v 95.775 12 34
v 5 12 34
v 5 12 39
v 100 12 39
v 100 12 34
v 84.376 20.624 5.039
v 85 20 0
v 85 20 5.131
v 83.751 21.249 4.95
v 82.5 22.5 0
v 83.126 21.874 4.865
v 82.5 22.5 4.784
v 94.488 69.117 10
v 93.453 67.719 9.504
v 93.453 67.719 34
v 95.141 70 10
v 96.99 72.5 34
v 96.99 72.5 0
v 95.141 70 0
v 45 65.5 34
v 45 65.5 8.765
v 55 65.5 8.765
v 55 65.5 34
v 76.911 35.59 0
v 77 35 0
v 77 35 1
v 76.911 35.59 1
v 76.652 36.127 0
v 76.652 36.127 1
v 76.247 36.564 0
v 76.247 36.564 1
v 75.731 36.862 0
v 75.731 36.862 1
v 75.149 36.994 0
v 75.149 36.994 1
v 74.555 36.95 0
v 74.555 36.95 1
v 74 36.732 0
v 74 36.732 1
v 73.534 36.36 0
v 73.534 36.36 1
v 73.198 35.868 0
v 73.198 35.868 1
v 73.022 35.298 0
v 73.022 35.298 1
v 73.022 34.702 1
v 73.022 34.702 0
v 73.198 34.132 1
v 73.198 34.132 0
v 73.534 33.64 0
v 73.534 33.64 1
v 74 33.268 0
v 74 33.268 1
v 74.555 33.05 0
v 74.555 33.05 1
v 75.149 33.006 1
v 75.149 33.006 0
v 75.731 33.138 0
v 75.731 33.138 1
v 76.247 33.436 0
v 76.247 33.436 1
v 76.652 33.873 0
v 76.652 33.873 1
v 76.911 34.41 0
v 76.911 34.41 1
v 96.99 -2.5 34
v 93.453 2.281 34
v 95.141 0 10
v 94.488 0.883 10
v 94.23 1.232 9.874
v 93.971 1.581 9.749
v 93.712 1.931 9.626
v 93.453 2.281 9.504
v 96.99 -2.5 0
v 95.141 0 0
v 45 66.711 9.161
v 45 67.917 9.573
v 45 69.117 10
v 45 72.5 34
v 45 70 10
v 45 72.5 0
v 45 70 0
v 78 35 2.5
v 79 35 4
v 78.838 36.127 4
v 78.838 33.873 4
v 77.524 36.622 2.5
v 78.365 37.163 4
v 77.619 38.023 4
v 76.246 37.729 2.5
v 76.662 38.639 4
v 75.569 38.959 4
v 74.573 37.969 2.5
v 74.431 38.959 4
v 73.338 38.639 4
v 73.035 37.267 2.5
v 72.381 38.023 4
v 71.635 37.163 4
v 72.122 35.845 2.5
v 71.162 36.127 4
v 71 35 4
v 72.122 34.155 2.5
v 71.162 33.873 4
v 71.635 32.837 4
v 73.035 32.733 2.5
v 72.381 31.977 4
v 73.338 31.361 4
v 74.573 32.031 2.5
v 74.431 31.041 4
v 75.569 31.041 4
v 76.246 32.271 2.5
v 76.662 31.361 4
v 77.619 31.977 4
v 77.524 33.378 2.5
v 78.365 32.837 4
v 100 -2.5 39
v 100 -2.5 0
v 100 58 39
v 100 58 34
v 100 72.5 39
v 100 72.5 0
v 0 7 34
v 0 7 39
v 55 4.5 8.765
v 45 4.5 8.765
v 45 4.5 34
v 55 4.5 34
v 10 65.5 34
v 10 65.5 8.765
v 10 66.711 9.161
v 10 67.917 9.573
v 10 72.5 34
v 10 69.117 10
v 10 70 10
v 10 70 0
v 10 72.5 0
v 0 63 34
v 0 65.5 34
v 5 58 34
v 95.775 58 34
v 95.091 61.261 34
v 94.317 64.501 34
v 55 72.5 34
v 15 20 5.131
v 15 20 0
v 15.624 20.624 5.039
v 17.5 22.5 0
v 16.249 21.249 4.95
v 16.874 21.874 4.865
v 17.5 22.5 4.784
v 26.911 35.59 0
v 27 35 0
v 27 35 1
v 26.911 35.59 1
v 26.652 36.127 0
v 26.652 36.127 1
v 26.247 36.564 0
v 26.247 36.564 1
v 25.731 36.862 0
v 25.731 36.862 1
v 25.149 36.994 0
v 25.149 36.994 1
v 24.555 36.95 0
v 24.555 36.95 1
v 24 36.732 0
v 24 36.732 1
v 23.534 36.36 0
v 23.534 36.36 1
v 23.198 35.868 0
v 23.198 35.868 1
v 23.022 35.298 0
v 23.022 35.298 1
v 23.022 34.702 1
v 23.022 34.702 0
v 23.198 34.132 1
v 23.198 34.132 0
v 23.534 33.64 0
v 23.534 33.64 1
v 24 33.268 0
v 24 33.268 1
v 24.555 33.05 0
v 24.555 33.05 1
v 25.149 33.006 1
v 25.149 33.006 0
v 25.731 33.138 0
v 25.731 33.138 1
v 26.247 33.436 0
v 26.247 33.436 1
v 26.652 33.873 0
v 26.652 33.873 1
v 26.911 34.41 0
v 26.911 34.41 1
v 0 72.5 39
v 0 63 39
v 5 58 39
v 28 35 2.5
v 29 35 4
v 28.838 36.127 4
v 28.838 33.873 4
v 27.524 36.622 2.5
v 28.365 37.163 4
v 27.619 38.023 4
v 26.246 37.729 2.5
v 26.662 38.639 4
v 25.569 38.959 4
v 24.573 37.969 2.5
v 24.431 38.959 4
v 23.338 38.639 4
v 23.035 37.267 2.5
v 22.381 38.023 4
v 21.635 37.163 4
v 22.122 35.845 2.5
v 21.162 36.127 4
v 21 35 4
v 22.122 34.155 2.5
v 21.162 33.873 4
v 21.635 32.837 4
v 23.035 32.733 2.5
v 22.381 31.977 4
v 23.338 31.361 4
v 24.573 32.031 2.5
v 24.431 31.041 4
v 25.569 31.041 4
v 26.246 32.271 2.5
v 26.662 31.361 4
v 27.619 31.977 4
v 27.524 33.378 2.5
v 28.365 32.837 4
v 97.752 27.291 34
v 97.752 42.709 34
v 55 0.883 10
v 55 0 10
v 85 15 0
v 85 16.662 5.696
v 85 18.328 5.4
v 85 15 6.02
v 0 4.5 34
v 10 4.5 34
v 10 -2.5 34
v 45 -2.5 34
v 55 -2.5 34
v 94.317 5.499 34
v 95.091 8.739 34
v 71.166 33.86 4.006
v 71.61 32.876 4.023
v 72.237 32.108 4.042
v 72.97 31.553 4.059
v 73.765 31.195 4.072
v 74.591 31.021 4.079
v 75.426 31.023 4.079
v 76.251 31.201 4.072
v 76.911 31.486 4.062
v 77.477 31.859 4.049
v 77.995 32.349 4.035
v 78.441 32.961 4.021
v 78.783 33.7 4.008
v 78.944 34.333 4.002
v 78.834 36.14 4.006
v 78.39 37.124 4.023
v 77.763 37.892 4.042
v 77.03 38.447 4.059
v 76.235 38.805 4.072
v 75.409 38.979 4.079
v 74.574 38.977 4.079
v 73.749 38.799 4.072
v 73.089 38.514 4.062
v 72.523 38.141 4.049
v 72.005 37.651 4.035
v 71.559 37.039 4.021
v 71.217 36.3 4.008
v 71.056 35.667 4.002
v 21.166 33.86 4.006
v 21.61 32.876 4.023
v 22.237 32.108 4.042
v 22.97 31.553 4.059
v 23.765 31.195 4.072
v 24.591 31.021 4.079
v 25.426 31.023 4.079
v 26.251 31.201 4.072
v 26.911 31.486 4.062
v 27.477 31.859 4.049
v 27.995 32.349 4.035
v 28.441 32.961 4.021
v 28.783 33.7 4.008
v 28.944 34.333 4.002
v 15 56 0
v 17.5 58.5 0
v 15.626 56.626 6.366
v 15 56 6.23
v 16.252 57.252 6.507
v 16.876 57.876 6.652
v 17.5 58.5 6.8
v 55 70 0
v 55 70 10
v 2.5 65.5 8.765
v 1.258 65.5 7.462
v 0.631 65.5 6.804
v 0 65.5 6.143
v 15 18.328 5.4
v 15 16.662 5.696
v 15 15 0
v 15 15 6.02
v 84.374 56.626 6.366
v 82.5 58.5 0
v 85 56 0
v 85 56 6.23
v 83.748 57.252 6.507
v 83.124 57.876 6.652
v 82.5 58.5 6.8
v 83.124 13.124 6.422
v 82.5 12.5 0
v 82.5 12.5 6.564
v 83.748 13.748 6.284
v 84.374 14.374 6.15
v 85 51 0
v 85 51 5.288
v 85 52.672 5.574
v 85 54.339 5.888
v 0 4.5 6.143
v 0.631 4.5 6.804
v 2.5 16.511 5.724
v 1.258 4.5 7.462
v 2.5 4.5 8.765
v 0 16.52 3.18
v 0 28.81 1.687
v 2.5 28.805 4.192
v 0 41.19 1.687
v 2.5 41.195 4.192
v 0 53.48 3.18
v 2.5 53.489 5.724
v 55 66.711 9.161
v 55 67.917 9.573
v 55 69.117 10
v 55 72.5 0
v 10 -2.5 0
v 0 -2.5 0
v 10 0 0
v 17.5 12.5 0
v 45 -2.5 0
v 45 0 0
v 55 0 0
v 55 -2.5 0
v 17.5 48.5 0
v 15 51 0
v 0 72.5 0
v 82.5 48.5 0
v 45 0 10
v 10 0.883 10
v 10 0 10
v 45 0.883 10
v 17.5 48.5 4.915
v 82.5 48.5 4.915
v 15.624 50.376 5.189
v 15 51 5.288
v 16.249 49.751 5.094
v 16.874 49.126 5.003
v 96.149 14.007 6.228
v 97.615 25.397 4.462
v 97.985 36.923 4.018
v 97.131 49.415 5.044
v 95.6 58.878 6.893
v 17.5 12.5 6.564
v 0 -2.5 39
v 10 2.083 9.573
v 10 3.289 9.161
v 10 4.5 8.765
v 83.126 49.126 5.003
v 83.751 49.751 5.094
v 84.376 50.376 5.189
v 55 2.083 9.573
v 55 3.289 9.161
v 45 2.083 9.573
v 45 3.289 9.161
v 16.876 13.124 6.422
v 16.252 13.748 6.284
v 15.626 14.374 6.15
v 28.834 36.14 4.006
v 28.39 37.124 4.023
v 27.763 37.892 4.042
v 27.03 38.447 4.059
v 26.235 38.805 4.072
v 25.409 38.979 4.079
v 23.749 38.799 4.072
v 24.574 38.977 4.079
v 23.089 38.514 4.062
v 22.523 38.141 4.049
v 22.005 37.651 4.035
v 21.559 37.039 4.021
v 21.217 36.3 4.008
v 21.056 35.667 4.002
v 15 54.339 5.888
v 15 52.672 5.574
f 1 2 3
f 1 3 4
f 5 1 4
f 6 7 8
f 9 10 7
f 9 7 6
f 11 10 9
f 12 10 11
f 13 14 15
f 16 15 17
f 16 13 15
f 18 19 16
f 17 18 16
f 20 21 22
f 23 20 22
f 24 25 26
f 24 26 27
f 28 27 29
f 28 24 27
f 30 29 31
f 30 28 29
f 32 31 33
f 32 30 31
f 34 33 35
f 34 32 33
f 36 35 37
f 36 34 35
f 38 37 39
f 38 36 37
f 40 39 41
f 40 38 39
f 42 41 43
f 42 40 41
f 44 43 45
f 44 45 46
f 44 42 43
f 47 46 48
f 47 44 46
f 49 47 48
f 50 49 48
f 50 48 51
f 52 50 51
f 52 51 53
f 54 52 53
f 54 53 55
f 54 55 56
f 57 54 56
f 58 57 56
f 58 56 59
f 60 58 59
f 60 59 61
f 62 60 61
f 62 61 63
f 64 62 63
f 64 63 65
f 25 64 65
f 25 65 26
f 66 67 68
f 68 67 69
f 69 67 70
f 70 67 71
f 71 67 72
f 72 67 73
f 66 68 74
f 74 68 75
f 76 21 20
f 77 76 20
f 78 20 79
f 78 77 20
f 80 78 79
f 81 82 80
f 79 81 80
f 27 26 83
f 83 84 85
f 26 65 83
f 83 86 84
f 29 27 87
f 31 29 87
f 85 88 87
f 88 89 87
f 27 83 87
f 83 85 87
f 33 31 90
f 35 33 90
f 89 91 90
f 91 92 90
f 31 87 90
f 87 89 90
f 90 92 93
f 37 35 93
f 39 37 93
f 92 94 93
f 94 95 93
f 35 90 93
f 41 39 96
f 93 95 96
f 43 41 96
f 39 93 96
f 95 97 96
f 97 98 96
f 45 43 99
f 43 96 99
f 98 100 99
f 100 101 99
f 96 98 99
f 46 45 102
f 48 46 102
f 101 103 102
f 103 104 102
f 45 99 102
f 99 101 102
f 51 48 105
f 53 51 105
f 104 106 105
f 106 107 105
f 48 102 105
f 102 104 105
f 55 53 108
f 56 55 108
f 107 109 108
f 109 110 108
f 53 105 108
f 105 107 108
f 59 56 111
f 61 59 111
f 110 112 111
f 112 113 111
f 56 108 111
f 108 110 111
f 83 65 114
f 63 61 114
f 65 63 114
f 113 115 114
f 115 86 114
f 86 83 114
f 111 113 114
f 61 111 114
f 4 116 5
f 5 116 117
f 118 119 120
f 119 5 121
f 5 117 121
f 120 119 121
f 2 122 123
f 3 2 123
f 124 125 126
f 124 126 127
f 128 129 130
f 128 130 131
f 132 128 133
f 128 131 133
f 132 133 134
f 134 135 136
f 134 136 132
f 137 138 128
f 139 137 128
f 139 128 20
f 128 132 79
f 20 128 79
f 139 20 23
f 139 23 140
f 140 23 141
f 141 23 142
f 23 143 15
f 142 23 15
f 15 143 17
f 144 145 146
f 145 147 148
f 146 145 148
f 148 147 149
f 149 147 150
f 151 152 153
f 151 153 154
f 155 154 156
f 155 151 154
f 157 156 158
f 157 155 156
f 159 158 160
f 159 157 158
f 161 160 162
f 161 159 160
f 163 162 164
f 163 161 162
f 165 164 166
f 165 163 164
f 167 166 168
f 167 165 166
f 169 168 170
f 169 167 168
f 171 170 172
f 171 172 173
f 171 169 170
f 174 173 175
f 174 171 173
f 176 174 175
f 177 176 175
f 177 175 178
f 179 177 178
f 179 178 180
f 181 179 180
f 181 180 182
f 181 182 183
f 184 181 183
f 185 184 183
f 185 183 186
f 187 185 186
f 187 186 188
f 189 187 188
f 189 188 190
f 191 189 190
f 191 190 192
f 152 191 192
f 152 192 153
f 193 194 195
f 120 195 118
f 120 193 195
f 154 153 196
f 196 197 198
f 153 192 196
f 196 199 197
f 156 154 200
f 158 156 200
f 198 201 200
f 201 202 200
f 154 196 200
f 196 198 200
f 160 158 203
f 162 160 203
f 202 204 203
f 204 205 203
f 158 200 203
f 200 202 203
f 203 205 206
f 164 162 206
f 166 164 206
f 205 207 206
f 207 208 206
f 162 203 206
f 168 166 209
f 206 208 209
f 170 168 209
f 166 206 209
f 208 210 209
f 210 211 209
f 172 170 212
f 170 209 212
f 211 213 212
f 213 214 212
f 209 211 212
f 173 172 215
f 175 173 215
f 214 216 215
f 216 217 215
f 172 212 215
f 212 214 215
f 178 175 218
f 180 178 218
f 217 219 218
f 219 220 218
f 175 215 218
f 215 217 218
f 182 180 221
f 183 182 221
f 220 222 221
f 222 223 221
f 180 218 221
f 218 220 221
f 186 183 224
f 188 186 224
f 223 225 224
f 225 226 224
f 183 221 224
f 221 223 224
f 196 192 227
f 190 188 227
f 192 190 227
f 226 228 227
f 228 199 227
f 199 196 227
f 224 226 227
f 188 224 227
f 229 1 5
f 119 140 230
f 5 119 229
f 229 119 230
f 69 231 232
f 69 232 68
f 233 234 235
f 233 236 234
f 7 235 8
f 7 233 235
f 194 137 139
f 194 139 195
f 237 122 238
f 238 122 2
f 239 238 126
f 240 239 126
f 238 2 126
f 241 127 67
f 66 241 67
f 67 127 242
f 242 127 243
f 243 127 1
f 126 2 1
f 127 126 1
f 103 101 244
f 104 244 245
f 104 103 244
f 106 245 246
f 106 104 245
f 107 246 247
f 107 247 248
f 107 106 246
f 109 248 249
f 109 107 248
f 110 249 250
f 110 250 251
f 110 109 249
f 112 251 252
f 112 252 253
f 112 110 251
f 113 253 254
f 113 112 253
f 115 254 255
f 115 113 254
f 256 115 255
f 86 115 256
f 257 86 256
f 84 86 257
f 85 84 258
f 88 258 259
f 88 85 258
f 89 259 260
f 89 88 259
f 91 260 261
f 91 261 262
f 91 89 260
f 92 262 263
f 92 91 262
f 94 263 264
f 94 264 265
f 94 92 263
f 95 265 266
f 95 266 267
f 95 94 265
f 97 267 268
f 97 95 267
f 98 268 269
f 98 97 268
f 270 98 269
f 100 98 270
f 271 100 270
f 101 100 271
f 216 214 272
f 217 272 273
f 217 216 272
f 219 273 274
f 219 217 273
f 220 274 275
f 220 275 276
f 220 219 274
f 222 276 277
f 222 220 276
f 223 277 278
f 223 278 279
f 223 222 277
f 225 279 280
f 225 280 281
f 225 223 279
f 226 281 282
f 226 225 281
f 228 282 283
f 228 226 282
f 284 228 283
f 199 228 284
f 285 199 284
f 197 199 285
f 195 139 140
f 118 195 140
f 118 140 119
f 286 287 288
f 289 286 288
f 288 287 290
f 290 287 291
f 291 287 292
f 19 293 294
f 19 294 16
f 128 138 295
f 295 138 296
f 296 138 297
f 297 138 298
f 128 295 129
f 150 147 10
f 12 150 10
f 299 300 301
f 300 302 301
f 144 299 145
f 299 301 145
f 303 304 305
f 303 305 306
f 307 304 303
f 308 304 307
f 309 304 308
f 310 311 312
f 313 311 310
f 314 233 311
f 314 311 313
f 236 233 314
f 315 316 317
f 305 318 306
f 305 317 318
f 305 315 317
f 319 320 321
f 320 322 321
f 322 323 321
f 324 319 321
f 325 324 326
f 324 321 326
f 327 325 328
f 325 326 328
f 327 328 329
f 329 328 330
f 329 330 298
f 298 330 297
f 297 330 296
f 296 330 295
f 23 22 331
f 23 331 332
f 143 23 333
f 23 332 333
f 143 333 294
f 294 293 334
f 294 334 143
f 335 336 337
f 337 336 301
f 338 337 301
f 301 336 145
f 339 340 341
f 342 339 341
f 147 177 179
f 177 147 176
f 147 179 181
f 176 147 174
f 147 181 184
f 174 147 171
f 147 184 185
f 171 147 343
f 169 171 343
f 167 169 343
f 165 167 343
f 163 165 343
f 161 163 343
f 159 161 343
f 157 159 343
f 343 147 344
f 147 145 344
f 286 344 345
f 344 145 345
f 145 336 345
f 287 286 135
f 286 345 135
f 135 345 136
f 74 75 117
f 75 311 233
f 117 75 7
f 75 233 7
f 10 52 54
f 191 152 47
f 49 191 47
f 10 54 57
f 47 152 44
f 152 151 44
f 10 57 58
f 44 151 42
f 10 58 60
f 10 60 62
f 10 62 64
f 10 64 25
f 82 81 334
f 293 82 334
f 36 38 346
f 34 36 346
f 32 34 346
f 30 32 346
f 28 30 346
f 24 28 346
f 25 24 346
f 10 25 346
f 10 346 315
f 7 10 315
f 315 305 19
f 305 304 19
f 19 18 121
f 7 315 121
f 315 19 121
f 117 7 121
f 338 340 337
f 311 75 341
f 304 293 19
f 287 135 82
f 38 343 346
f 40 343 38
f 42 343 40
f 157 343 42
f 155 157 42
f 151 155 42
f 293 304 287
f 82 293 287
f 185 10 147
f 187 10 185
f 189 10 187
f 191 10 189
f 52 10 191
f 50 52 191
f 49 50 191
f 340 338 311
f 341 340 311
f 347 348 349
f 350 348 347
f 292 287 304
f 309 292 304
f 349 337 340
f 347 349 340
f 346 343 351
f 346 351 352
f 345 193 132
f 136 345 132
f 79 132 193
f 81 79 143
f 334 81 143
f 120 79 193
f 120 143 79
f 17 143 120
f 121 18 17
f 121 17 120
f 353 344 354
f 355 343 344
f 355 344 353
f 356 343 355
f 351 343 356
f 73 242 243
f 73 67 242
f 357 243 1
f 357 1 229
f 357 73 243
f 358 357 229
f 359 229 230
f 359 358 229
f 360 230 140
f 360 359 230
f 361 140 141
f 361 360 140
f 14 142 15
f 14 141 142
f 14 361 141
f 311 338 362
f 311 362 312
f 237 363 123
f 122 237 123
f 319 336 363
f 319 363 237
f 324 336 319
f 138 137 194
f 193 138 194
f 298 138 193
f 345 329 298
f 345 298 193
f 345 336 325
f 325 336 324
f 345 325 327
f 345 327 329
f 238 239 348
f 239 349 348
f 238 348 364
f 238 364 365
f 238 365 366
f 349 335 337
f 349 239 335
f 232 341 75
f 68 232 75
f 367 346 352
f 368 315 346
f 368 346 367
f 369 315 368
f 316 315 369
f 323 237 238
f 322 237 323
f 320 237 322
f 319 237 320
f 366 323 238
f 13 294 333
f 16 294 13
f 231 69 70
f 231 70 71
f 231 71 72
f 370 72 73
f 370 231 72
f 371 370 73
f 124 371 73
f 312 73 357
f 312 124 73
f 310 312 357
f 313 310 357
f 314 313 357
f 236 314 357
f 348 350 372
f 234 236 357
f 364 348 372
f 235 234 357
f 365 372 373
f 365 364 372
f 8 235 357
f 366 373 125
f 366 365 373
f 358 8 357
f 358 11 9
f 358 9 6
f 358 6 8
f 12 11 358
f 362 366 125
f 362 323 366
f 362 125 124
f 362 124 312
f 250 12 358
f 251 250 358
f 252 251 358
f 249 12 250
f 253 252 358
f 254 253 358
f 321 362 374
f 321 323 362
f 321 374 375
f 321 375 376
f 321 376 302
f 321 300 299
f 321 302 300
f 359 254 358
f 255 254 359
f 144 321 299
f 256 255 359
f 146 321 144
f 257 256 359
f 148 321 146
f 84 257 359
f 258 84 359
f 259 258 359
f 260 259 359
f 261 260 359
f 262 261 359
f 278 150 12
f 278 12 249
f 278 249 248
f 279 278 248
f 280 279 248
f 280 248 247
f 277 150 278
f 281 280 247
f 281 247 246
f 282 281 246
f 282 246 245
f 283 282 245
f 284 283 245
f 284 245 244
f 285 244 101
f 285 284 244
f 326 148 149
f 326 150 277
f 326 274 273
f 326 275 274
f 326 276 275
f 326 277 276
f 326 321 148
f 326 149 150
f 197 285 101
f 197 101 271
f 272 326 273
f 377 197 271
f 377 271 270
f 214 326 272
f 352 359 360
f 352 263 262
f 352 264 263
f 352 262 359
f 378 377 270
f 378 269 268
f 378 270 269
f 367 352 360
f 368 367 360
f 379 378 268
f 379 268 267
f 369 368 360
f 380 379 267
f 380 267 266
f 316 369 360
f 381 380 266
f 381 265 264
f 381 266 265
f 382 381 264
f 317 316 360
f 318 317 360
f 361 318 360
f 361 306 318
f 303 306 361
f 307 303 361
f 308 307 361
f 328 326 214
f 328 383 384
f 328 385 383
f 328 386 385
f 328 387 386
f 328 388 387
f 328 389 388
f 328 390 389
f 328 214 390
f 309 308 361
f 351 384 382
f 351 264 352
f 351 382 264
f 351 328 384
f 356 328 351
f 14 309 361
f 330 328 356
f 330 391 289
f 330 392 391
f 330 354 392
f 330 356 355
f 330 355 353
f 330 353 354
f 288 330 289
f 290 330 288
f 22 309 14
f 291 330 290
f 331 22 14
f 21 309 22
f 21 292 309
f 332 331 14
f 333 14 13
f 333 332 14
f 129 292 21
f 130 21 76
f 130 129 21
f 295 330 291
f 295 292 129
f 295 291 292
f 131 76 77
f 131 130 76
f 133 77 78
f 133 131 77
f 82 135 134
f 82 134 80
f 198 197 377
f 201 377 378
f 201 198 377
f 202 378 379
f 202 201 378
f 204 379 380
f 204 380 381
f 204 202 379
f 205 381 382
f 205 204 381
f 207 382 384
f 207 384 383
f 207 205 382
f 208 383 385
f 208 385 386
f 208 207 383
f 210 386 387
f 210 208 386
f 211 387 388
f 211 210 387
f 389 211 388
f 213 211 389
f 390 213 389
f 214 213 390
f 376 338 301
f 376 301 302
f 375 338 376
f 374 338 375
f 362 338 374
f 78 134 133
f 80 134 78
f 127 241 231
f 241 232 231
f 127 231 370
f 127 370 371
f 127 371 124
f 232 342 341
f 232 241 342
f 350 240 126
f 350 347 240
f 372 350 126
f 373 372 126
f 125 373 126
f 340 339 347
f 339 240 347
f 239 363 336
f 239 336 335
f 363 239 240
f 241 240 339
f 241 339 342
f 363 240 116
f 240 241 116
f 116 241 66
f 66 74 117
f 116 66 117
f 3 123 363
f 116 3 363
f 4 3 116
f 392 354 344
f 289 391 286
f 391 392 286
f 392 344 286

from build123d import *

# Parameters (mm, degrees)
CYLINDER001_R     = 120
CYLINDER001_DEPTH = 40
BOX001_W          = 10
BOX001_H          = 75
BOX001_DEPTH      = 34
CHAMFER004_SIZE   = 5
BOX008_W          = 70
BOX008_H          = 10
BOX008_DEPTH      = 10
CHAMFER_SIZE      = 2.5
BOX009_W          = 70
BOX009_H          = 10
BOX009_DEPTH      = 10
CHAMFER001_SIZE   = 2.5
CYLINDER005_R     = 2
CYLINDER005_DEPTH = 10
CYLINDER004_R     = 4
CYLINDER004_DEPTH = 10
CYLINDER003_R     = 2
CYLINDER003_DEPTH = 10
CYLINDER002_R     = 4
CYLINDER002_DEPTH = 10
CYLINDER_R        = 100
CYLINDER_DEPTH    = 100
BOX_W             = 100
BOX_H             = 70
BOX_DEPTH         = 10
CHAMFER012_SIZE   = 2.5
BOX002_W          = 10
BOX002_H          = 7
BOX002_DEPTH      = 34
BOX003_W          = 100
BOX003_H          = 14.5
BOX003_DEPTH      = 5
BOX004_W          = 10
BOX004_H          = 7
BOX004_DEPTH      = 34
BOX005_W          = 10
BOX005_H          = 7
BOX005_DEPTH      = 34
BOX006_W          = 10
BOX006_H          = 7
BOX006_DEPTH      = 34
BOX007_W          = 100
BOX007_H          = 14.5
BOX007_DEPTH      = 5
CHAMFER013_SIZE   = 5


with BuildPart() as cylinder001:
    # Cylinder001 → Cylinder001 (new body)
    with BuildSketch(Plane(origin=(-22, 35, 0), x_dir=(1, 0, 0), z_dir=(0, 0, 1))):
        Circle(CYLINDER001_R)
    extrude(amount=CYLINDER001_DEPTH)


with BuildPart() as chamfer004:
    # Box001 → Box001 (new body)
    with BuildSketch(Plane(origin=(90, -2.5, 0), x_dir=(1, 0, 0), z_dir=(0, 0, 1))):
        with Locations((5, 37.5)):
            Rectangle(BOX001_W, BOX001_H)
    extrude(amount=BOX001_DEPTH)

    # Cut001: cut Cylinder001
    add(cylinder001.part, mode=Mode.SUBTRACT)

    # Chamfer004
    chamfer004_edges = [chamfer004.edges().sort_by_distance(p)[0] for p in [
        (91.990131, -2.5, 17),
        (91.990131, 72.5, 17),
    ]]
    chamfer(chamfer004_edges, length=CHAMFER004_SIZE)


with BuildPart() as chamfer_body:
    # Box008 → Box008 (new body)
    with BuildSketch(Plane.XY):
        with Locations((35, 5)):
            Rectangle(BOX008_W, BOX008_H)
    extrude(amount=BOX008_DEPTH)

    # Chamfer
    chamfer_edges = [chamfer_body.edges().sort_by_distance(p)[0] for p in [
        (0, 0, 5),
        (0, 10, 5),
        (70, 0, 5),
        (70, 10, 5),
    ]]
    chamfer(chamfer_edges, length=CHAMFER_SIZE)


with BuildPart() as chamfer_body_1:
    # Chamfer placement: moved
    add(chamfer_body.part.moved(Location((15, 12.5, 0))))


with BuildPart() as fusion004:
    # Box009 → Box009 (new body)
    with BuildSketch(Plane.XY):
        with Locations((35, 5)):
            Rectangle(BOX009_W, BOX009_H)
    extrude(amount=BOX009_DEPTH)

    # Chamfer001
    chamfer001_edges = [fusion004.edges().sort_by_distance(p)[0] for p in [
        (0, 0, 5),
        (0, 10, 5),
        (70, 0, 5),
        (70, 10, 5),
    ]]
    chamfer(chamfer001_edges, length=CHAMFER001_SIZE)


with BuildPart() as fusion004_1:
    # Chamfer001 placement: moved
    add(fusion004.part.moved(Location((15, 48.5, 0))))

    # Fusion004: union Chamfer body
    add(chamfer_body_1.part)


with BuildPart() as cone001:
    # Cone001 → Cone001 (revolve)
    with BuildSketch(Plane(origin=(0, 35, 10), x_dir=(1, 0, 0), z_dir=(0, -1, 0))):
        Polygon((0, 0), (2, 0), (4, 3), (0, 3), align=None)
    revolve(axis=Axis((0, 35, 10), (0, 0, 1)))


with BuildPart() as cylinder005:
    # Cylinder005 → Cylinder005 (new body)
    with BuildSketch(Plane(origin=(0, 35, 0), x_dir=(1, 0, 0), z_dir=(0, 0, 1))):
        Circle(CYLINDER005_R)
    extrude(amount=CYLINDER005_DEPTH)


with BuildPart() as countersink_mount001:
    # Cylinder004 → Cylinder004 (new body)
    with BuildSketch(Plane(origin=(0, 35, 13), x_dir=(1, 0, 0), z_dir=(0, 0, 1))):
        Circle(CYLINDER004_R)
    extrude(amount=CYLINDER004_DEPTH)

    # Fusion001: union Cone001, Cylinder005
    add(cone001.part)
    add(cylinder005.part)


with BuildPart() as countersink_mount001_1:
    # Fusion001 placement: moved
    add(countersink_mount001.part.moved(Location((75, 0, -9))))


with BuildPart() as cone:
    # Cone → Cone (revolve)
    with BuildSketch(Plane(origin=(0, 35, 10), x_dir=(1, 0, 0), z_dir=(0, -1, 0))):
        Polygon((0, 0), (2, 0), (4, 3), (0, 3), align=None)
    revolve(axis=Axis((0, 35, 10), (0, 0, 1)))


with BuildPart() as cylinder003:
    # Cylinder003 → Cylinder003 (new body)
    with BuildSketch(Plane(origin=(0, 35, 0), x_dir=(1, 0, 0), z_dir=(0, 0, 1))):
        Circle(CYLINDER003_R)
    extrude(amount=CYLINDER003_DEPTH)


with BuildPart() as fusion002:
    # Cylinder002 → Cylinder002 (new body)
    with BuildSketch(Plane(origin=(0, 35, 13), x_dir=(1, 0, 0), z_dir=(0, 0, 1))):
        Circle(CYLINDER002_R)
    extrude(amount=CYLINDER002_DEPTH)

    # Fusion: union Cone, Cylinder003
    add(cone.part)
    add(cylinder003.part)


with BuildPart() as fusion002_1:
    # Fusion placement: moved
    add(fusion002.part.moved(Location((25, 0, -9))))

    # Fusion002: union countersink mount001
    add(countersink_mount001_1.part)


with BuildPart() as cylinder:
    # Cylinder → Cylinder (new body)
    with BuildSketch(Plane(origin=(0, 35, 104), x_dir=(0, 0, -1), z_dir=(1, 0, 0))):
        Circle(CYLINDER_R)
    extrude(amount=CYLINDER_DEPTH)


with BuildPart() as chamfer012:
    # Box → Box (new body)
    with BuildSketch(Plane.XY):
        with Locations((50, 35)):
            Rectangle(BOX_W, BOX_H)
    extrude(amount=BOX_DEPTH)

    # Cut: cut Cylinder
    add(cylinder.part, mode=Mode.SUBTRACT)

    # Cut002: cut Fusion002
    add(fusion002_1.part, mode=Mode.SUBTRACT)

    # Cut003: cut Fusion004
    add(fusion004_1.part, mode=Mode.SUBTRACT)

    # Chamfer012
    chamfer012_edges = [chamfer012.edges().sort_by_distance(p)[0] for p in [
        (0, 17.679492, 5.511422),
        (0, 52.320508, 5.511422),
    ]]
    chamfer(chamfer012_edges, length=CHAMFER012_SIZE)


with BuildPart() as cube002:
    # Box002 → Box002 (new body)
    with BuildSketch(Plane(origin=(0, 65.5, 0), x_dir=(1, 0, 0), z_dir=(0, 0, 1))):
        with Locations((5, 3.5)):
            Rectangle(BOX002_W, BOX002_H)
    extrude(amount=BOX002_DEPTH)


with BuildPart() as cube003:
    # Box003 → Box003 (new body)
    with BuildSketch(Plane(origin=(0, 58, 34), x_dir=(1, 0, 0), z_dir=(0, 0, 1))):
        with Locations((50, 7.25)):
            Rectangle(BOX003_W, BOX003_H)
    extrude(amount=BOX003_DEPTH)


with BuildPart() as cube004:
    # Box004 → Box004 (new body)
    with BuildSketch(Plane(origin=(45, 65.5, 0), x_dir=(1, 0, 0), z_dir=(0, 0, 1))):
        with Locations((5, 3.5)):
            Rectangle(BOX004_W, BOX004_H)
    extrude(amount=BOX004_DEPTH)


with BuildPart() as cube005:
    # Box005 → Box005 (new body)
    with BuildSketch(Plane(origin=(0, -2.5, 0), x_dir=(1, 0, 0), z_dir=(0, 0, 1))):
        with Locations((5, 3.5)):
            Rectangle(BOX005_W, BOX005_H)
    extrude(amount=BOX005_DEPTH)


with BuildPart() as cube006:
    # Box006 → Box006 (new body)
    with BuildSketch(Plane(origin=(45, -2.5, 0), x_dir=(1, 0, 0), z_dir=(0, 0, 1))):
        with Locations((5, 3.5)):
            Rectangle(BOX006_W, BOX006_H)
    extrude(amount=BOX006_DEPTH)


with BuildPart() as chamfer013:
    # Box007 → Box007 (new body)
    with BuildSketch(Plane(origin=(0, -2.5, 34), x_dir=(1, 0, 0), z_dir=(0, 0, 1))):
        with Locations((50, 7.25)):
            Rectangle(BOX007_W, BOX007_H)
    extrude(amount=BOX007_DEPTH)

    # Fusion003: union Cube002, Cube003, Cube004, Cube005, Cube006
    add(cube002.part)
    add(cube003.part)
    add(cube004.part)
    add(cube005.part)
    add(cube006.part)

    # Fusion005: union Chamfer004, Chamfer012
    add(chamfer004.part)
    add(chamfer012.part)

    # Chamfer013
    chamfer013_edges = [chamfer013.edges().sort_by_distance(p)[0] for p in [
        (0, 12, 36.5),
        (0, 58, 36.5),
    ]]
    chamfer(chamfer013_edges, length=CHAMFER013_SIZE)


solid = chamfer013.part
